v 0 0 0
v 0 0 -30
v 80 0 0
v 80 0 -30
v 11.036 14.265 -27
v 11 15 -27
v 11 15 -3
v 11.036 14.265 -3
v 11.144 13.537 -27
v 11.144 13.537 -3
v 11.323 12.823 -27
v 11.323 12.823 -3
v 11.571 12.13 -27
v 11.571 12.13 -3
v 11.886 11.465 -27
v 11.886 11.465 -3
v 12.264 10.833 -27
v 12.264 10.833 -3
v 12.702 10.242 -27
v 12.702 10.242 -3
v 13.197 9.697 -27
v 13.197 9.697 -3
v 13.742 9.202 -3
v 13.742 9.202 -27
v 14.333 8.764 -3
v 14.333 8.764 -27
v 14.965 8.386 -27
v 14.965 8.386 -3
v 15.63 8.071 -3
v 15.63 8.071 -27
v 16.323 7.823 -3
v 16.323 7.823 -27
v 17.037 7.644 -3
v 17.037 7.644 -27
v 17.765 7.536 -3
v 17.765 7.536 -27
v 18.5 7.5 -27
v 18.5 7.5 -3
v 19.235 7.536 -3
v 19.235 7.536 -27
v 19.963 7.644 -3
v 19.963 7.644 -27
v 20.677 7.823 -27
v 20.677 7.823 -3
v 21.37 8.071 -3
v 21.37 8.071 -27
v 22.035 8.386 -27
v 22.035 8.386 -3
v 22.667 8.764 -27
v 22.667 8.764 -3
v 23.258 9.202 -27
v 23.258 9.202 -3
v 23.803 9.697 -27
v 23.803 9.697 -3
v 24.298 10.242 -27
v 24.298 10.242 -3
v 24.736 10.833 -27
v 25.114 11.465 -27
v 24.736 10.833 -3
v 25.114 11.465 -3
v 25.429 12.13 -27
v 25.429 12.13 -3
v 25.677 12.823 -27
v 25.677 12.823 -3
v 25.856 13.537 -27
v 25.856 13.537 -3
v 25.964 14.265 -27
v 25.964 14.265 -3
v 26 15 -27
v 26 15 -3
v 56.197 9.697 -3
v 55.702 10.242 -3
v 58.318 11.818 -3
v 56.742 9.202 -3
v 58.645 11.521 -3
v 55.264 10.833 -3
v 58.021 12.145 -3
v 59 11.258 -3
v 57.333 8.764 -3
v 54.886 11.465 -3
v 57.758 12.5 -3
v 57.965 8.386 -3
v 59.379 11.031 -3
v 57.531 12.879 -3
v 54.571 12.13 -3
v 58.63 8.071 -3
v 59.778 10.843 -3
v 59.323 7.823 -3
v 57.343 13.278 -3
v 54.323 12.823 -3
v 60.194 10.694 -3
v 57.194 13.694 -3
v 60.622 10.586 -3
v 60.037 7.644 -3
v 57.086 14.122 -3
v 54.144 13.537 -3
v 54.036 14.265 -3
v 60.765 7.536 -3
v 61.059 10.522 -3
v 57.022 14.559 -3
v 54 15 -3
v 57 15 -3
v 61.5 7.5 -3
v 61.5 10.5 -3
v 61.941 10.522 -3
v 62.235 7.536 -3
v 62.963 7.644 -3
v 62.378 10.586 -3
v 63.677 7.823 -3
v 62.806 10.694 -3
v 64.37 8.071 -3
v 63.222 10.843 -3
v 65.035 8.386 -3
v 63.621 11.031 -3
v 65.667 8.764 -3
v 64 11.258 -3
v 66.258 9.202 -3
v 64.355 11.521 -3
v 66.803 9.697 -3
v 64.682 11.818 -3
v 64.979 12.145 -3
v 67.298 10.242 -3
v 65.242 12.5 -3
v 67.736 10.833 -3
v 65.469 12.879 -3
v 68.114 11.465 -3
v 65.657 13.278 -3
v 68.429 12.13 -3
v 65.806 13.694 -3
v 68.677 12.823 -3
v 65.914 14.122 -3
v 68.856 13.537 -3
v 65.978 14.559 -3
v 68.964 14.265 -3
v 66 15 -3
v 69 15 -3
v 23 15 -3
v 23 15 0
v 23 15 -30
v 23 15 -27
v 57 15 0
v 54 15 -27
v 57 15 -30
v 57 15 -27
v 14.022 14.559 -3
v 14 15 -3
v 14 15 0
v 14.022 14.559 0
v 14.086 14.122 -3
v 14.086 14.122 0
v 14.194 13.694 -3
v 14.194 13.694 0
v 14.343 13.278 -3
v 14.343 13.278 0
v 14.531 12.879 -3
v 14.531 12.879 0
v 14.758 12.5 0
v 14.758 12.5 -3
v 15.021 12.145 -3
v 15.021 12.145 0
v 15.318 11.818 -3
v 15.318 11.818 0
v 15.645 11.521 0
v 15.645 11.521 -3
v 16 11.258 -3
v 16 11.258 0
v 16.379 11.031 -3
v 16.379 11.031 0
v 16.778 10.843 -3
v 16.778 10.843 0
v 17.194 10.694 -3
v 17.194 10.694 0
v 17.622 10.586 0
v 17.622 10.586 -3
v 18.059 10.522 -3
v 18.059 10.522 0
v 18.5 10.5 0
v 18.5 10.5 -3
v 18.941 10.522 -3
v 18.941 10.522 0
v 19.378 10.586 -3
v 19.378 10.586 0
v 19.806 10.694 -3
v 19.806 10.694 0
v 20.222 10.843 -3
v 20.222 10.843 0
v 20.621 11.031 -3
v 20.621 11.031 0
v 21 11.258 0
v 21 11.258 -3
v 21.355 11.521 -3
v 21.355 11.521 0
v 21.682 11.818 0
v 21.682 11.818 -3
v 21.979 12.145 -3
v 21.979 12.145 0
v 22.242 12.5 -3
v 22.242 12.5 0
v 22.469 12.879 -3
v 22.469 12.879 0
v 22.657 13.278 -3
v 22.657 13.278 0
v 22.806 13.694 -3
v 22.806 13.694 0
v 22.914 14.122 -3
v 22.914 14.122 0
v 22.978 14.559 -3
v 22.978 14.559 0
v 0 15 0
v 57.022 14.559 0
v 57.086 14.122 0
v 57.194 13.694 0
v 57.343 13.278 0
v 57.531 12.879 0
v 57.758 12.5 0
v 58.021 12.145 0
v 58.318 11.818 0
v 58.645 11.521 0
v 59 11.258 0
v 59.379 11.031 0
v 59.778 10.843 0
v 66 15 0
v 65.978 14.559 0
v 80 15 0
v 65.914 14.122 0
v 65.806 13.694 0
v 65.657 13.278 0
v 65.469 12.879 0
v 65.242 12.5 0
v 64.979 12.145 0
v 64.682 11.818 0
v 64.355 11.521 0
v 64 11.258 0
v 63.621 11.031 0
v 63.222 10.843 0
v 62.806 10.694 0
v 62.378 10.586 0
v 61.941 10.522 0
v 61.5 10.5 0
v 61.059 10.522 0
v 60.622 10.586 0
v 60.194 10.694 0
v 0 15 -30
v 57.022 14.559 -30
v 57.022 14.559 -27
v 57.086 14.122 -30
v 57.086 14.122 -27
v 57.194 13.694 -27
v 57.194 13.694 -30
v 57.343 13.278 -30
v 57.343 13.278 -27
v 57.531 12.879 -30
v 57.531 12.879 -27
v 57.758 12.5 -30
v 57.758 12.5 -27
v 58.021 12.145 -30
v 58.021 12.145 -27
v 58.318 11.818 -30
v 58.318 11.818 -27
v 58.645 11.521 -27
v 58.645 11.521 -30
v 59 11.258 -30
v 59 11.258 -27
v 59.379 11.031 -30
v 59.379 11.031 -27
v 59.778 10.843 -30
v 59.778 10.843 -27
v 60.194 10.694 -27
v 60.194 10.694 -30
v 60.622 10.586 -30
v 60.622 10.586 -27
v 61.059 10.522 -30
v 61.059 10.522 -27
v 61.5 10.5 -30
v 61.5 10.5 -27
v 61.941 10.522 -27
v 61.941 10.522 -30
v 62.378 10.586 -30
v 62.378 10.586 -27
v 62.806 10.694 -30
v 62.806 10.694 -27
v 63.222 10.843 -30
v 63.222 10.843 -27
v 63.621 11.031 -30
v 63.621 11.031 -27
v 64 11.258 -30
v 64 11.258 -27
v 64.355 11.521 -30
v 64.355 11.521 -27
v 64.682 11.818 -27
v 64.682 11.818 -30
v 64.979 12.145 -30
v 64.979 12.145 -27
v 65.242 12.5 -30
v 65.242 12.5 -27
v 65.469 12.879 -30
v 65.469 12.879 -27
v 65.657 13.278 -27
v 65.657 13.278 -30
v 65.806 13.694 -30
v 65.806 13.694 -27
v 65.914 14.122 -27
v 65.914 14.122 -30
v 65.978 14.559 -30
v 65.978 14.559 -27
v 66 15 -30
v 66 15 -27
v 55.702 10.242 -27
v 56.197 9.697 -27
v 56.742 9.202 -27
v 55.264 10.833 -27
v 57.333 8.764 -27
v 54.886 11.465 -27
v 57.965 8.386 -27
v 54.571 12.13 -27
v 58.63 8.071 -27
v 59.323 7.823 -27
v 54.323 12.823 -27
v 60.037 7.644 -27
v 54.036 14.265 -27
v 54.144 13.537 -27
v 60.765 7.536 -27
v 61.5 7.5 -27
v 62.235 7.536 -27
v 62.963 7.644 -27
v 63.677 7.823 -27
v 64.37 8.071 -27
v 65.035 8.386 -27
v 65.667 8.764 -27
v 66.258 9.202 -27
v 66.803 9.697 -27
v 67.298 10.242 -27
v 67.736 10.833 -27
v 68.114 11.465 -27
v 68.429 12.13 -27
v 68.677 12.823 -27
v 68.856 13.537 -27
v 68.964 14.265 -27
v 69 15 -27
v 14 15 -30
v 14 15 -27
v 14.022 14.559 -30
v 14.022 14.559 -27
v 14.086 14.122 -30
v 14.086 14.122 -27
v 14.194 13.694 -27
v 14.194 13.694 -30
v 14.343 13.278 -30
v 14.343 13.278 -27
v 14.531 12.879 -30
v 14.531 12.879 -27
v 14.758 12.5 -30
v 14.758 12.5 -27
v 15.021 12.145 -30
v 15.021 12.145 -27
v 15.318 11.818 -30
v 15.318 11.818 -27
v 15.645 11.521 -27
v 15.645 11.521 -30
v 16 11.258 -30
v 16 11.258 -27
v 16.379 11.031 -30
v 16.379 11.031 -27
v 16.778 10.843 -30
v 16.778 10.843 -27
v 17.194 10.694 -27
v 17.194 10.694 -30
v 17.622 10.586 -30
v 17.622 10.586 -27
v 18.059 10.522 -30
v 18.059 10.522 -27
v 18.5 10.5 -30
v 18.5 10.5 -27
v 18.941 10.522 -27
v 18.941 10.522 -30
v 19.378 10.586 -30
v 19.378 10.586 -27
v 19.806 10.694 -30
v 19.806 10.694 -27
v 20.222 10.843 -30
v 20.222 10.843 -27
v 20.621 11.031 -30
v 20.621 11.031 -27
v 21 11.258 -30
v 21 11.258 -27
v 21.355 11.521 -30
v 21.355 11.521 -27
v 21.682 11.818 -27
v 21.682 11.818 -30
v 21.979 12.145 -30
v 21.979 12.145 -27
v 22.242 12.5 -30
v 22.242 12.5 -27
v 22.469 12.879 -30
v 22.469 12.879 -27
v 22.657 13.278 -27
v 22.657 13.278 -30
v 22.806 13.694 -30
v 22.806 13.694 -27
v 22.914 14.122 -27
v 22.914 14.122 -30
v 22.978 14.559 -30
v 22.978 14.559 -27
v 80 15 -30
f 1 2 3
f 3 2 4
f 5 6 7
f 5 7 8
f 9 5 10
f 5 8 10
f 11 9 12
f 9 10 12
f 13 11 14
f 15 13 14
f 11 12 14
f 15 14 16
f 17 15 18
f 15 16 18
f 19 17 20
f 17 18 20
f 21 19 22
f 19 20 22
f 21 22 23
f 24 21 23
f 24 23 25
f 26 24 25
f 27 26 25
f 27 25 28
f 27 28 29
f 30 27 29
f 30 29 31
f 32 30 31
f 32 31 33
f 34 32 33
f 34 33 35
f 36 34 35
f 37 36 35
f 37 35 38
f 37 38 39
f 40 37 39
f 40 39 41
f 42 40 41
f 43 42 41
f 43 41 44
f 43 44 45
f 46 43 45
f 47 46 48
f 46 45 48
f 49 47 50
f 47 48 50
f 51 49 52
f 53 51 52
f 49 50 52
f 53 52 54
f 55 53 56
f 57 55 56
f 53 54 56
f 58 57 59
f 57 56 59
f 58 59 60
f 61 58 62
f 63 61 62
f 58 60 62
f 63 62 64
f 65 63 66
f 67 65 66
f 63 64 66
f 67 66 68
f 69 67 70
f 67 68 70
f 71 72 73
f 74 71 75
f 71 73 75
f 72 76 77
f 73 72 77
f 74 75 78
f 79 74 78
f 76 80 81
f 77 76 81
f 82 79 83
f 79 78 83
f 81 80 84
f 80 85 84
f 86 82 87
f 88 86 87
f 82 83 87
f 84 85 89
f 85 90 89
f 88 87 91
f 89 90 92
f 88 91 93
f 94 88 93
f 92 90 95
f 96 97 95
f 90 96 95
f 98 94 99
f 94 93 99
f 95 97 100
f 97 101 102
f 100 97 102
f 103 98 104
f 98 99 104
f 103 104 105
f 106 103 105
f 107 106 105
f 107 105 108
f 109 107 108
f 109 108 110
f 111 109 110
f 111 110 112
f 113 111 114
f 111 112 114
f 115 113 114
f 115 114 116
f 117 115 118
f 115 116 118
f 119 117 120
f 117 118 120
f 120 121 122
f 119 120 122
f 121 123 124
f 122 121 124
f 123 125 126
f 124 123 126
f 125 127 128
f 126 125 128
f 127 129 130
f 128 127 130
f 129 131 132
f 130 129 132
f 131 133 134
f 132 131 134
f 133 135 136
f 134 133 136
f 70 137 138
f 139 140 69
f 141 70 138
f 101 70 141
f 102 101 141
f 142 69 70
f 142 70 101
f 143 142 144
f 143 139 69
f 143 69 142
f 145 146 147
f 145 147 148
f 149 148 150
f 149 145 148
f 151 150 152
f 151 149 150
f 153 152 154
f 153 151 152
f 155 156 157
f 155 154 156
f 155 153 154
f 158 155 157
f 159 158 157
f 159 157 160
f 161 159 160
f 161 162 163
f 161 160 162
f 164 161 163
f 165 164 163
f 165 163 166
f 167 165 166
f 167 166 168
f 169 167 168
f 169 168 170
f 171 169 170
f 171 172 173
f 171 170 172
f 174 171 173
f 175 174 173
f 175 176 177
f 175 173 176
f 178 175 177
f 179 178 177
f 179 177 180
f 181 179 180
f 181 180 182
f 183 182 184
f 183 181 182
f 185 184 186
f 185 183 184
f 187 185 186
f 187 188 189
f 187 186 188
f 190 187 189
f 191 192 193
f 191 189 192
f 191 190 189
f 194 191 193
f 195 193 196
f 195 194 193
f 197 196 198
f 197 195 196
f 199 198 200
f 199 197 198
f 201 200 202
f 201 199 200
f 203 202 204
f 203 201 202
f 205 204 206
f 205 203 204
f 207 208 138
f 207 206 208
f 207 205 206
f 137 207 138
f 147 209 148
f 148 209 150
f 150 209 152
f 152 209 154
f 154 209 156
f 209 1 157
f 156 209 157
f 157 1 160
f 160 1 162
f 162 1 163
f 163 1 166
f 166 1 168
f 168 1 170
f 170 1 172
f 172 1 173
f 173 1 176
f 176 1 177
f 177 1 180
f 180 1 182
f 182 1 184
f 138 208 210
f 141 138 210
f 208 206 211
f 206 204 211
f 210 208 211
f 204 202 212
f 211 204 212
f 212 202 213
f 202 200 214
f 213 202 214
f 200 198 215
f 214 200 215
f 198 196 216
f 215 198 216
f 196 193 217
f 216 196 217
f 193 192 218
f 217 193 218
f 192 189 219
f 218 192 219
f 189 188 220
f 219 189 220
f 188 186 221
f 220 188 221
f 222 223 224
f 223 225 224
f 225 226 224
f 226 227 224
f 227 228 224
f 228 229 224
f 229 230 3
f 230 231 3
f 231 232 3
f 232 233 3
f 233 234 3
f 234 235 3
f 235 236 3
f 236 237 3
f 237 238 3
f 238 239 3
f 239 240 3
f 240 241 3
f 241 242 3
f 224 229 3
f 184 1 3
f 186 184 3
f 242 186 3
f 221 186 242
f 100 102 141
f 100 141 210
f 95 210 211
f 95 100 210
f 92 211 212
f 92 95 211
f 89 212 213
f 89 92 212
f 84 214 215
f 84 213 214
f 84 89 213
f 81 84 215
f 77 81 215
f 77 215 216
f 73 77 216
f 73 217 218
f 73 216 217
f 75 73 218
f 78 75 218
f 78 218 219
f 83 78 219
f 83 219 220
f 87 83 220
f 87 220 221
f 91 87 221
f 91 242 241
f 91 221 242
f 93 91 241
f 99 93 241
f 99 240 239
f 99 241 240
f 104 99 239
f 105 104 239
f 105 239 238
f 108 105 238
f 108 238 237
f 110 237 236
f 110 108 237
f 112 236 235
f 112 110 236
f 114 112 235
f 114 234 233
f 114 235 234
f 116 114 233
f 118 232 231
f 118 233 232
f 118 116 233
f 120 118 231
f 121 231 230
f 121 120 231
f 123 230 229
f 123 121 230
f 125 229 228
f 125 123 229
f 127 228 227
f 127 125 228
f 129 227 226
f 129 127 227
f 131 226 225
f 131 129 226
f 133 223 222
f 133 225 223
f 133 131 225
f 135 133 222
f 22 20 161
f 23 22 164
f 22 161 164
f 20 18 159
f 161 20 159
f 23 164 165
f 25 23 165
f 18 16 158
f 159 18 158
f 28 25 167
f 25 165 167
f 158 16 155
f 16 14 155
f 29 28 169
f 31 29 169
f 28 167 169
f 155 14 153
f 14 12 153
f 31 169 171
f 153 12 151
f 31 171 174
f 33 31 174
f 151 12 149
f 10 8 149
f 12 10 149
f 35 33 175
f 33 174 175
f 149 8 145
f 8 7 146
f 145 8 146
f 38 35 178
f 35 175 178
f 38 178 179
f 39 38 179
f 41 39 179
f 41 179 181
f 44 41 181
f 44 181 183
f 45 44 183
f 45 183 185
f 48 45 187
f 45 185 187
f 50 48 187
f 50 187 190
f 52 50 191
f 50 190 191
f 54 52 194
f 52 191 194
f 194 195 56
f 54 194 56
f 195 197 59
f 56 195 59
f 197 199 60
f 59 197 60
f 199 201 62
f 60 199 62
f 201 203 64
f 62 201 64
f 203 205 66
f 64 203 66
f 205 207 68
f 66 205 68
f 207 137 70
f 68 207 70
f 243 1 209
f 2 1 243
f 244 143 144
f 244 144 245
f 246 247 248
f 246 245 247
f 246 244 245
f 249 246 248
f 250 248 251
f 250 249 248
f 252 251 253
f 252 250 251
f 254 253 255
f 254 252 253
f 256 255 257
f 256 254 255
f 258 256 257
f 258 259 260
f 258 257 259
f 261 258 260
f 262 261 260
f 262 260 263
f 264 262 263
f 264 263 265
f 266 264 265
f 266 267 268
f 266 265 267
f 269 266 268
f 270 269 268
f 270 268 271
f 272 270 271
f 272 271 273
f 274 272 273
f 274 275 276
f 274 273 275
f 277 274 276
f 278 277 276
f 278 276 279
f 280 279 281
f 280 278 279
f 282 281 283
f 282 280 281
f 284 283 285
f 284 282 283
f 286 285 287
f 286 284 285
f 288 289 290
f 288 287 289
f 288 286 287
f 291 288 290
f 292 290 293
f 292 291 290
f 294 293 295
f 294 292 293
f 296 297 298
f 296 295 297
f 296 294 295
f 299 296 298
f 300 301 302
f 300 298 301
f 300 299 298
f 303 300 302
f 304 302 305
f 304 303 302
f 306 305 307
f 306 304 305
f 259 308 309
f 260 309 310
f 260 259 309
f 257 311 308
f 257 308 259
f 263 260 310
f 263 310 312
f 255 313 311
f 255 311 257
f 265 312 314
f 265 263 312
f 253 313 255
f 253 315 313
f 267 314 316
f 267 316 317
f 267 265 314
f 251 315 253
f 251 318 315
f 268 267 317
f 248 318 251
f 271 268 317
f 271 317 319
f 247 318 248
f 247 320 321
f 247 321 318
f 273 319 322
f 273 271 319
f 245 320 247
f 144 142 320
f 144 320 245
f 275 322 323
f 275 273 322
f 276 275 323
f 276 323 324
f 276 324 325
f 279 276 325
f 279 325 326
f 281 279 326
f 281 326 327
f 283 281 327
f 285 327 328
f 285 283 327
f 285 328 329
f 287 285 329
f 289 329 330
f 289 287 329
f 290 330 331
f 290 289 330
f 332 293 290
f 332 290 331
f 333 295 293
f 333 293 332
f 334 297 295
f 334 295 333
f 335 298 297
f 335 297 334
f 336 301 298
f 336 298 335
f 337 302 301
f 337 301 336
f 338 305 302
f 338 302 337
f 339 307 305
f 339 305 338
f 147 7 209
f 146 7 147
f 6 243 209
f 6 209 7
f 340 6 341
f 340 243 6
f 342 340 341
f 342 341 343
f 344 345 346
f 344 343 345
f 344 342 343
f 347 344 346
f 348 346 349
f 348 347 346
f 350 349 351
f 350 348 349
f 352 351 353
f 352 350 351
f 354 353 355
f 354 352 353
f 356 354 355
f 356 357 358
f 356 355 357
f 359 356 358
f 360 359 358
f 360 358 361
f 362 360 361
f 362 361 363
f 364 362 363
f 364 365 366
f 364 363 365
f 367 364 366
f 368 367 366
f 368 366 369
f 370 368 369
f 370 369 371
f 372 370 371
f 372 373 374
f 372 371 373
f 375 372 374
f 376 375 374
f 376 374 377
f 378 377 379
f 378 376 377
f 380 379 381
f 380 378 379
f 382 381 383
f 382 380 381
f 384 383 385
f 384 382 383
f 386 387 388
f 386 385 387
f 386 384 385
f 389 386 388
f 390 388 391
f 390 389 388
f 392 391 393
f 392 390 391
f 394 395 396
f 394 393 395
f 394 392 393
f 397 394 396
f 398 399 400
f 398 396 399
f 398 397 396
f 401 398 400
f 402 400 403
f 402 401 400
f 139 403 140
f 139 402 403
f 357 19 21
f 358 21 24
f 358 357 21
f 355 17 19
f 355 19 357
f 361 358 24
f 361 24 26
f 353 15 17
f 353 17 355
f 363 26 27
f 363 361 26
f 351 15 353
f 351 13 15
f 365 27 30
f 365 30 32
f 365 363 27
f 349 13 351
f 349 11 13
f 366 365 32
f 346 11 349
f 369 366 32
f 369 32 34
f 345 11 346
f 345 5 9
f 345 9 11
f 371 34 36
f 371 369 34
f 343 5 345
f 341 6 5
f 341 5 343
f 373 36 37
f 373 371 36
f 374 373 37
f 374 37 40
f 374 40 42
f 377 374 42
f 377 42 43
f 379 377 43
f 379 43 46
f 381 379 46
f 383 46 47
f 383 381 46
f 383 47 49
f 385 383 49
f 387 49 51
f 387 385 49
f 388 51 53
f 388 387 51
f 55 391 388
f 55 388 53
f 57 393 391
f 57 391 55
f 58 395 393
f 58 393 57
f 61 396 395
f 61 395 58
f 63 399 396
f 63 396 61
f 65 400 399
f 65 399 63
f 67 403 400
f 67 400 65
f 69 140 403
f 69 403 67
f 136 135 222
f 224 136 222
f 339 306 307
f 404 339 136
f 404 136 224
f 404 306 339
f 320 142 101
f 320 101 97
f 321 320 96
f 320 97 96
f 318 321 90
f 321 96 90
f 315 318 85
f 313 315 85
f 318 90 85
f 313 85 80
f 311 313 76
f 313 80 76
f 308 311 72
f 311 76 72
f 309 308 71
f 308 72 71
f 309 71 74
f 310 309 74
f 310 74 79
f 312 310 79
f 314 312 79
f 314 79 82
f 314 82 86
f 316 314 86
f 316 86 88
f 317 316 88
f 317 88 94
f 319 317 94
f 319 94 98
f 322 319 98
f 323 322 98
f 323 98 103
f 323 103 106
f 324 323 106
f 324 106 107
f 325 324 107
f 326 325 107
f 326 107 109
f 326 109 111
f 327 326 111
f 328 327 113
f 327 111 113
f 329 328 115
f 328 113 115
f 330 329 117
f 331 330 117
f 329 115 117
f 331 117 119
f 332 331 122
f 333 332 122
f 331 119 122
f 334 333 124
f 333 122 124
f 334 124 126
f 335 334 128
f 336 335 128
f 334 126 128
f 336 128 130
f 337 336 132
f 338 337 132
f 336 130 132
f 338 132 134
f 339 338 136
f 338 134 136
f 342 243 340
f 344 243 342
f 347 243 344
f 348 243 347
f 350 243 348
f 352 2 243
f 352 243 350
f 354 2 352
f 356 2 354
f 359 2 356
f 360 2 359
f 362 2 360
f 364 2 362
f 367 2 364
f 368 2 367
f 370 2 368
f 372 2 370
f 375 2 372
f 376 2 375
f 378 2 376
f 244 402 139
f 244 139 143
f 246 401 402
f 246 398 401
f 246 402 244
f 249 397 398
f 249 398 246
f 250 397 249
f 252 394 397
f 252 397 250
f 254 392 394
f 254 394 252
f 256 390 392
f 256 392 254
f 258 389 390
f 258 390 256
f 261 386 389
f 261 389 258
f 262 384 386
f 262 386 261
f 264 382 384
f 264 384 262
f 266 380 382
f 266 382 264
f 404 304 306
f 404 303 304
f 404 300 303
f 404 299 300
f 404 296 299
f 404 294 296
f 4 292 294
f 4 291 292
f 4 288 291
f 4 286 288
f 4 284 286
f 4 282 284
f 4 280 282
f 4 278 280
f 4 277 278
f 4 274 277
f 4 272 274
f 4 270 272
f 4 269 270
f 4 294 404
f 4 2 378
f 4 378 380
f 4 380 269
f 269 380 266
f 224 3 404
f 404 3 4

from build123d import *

# Parameters (mm, degrees)
SKETCH1_W               = 80
SKETCH1_H               = 30
BOSS_EXTRUDE1_DEPTH     = 15
SKETCH2_R               = 7.5
CUT_EXTRUDE1_DEPTH      = 87.746757864
SKETCH3_W               = 15
SKETCH3_H               = 3
BOSS_EXTRUDE2_DEPTH     = 10
CUT_EXTRUDE2_DEPTH      = 87.746757864
CUT_EXTRUDE2_DEPTH_BACK = 87.746757864
SKETCH4_R               = 4.5


with BuildPart() as part:
    # Sketch1 → Boss-Extrude1 (new body)
    with BuildSketch(Plane(origin=(0, 0, 0), x_dir=(1, 0, 0), z_dir=(0, 1, 0))):
        with Locations((40, 15)):
            Rectangle(SKETCH1_W, SKETCH1_H)
    extrude(amount=BOSS_EXTRUDE1_DEPTH)

    # Sketch2 → Cut-Extrude1 (cut, through all)
    with BuildSketch(Plane.XY):
        with Locations((18.5, 15)):
            Circle(SKETCH2_R)
        with Locations((61.5, 15)):
            Circle(SKETCH2_R)
    extrude(amount=-CUT_EXTRUDE1_DEPTH, mode=Mode.SUBTRACT)

    # Sketch3 → Boss-Extrude2 (add)
    with BuildSketch(Plane(origin=(0, 15, 0), x_dir=(1, 0, 0), z_dir=(0, 1, 0))):
        with Locations((18.5, 1.5)):
            Rectangle(SKETCH3_W, SKETCH3_H)
        with Locations((61.5, 28.5)):
            Rectangle(SKETCH3_W, SKETCH3_H)
        with Locations((61.5, 1.5)):
            Rectangle(SKETCH3_W, SKETCH3_H)
        with Locations((18.5, 28.5)):
            Rectangle(SKETCH3_W, SKETCH3_H)
    extrude(amount=-BOSS_EXTRUDE2_DEPTH)

    # Sketch4 → Cut-Extrude2 (cut, two sides: drawn at the far end of the back side and taken through both)
    with BuildSketch(Plane.XY.offset(-CUT_EXTRUDE2_DEPTH_BACK)):
        with Locations((18.5, 15)):
            Circle(SKETCH4_R)
        with Locations((61.5, 15)):
            Circle(SKETCH4_R)
    extrude(amount=CUT_EXTRUDE2_DEPTH + CUT_EXTRUDE2_DEPTH_BACK, mode=Mode.SUBTRACT)


solid = part.part
